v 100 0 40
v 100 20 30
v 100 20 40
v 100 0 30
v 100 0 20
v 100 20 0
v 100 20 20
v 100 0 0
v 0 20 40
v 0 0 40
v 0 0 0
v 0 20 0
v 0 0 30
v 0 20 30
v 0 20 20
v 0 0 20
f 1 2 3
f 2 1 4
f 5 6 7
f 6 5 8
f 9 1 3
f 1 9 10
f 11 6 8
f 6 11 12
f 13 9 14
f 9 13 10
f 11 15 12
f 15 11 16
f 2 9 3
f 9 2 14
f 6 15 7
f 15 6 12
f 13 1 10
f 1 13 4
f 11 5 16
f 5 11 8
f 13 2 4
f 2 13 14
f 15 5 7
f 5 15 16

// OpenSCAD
module bracket() {
    difference() {
        cube([100, 20, 40]);
        translate([0, -20, 20]) cube([120, 60, 10]);
    }
}
bracket();
